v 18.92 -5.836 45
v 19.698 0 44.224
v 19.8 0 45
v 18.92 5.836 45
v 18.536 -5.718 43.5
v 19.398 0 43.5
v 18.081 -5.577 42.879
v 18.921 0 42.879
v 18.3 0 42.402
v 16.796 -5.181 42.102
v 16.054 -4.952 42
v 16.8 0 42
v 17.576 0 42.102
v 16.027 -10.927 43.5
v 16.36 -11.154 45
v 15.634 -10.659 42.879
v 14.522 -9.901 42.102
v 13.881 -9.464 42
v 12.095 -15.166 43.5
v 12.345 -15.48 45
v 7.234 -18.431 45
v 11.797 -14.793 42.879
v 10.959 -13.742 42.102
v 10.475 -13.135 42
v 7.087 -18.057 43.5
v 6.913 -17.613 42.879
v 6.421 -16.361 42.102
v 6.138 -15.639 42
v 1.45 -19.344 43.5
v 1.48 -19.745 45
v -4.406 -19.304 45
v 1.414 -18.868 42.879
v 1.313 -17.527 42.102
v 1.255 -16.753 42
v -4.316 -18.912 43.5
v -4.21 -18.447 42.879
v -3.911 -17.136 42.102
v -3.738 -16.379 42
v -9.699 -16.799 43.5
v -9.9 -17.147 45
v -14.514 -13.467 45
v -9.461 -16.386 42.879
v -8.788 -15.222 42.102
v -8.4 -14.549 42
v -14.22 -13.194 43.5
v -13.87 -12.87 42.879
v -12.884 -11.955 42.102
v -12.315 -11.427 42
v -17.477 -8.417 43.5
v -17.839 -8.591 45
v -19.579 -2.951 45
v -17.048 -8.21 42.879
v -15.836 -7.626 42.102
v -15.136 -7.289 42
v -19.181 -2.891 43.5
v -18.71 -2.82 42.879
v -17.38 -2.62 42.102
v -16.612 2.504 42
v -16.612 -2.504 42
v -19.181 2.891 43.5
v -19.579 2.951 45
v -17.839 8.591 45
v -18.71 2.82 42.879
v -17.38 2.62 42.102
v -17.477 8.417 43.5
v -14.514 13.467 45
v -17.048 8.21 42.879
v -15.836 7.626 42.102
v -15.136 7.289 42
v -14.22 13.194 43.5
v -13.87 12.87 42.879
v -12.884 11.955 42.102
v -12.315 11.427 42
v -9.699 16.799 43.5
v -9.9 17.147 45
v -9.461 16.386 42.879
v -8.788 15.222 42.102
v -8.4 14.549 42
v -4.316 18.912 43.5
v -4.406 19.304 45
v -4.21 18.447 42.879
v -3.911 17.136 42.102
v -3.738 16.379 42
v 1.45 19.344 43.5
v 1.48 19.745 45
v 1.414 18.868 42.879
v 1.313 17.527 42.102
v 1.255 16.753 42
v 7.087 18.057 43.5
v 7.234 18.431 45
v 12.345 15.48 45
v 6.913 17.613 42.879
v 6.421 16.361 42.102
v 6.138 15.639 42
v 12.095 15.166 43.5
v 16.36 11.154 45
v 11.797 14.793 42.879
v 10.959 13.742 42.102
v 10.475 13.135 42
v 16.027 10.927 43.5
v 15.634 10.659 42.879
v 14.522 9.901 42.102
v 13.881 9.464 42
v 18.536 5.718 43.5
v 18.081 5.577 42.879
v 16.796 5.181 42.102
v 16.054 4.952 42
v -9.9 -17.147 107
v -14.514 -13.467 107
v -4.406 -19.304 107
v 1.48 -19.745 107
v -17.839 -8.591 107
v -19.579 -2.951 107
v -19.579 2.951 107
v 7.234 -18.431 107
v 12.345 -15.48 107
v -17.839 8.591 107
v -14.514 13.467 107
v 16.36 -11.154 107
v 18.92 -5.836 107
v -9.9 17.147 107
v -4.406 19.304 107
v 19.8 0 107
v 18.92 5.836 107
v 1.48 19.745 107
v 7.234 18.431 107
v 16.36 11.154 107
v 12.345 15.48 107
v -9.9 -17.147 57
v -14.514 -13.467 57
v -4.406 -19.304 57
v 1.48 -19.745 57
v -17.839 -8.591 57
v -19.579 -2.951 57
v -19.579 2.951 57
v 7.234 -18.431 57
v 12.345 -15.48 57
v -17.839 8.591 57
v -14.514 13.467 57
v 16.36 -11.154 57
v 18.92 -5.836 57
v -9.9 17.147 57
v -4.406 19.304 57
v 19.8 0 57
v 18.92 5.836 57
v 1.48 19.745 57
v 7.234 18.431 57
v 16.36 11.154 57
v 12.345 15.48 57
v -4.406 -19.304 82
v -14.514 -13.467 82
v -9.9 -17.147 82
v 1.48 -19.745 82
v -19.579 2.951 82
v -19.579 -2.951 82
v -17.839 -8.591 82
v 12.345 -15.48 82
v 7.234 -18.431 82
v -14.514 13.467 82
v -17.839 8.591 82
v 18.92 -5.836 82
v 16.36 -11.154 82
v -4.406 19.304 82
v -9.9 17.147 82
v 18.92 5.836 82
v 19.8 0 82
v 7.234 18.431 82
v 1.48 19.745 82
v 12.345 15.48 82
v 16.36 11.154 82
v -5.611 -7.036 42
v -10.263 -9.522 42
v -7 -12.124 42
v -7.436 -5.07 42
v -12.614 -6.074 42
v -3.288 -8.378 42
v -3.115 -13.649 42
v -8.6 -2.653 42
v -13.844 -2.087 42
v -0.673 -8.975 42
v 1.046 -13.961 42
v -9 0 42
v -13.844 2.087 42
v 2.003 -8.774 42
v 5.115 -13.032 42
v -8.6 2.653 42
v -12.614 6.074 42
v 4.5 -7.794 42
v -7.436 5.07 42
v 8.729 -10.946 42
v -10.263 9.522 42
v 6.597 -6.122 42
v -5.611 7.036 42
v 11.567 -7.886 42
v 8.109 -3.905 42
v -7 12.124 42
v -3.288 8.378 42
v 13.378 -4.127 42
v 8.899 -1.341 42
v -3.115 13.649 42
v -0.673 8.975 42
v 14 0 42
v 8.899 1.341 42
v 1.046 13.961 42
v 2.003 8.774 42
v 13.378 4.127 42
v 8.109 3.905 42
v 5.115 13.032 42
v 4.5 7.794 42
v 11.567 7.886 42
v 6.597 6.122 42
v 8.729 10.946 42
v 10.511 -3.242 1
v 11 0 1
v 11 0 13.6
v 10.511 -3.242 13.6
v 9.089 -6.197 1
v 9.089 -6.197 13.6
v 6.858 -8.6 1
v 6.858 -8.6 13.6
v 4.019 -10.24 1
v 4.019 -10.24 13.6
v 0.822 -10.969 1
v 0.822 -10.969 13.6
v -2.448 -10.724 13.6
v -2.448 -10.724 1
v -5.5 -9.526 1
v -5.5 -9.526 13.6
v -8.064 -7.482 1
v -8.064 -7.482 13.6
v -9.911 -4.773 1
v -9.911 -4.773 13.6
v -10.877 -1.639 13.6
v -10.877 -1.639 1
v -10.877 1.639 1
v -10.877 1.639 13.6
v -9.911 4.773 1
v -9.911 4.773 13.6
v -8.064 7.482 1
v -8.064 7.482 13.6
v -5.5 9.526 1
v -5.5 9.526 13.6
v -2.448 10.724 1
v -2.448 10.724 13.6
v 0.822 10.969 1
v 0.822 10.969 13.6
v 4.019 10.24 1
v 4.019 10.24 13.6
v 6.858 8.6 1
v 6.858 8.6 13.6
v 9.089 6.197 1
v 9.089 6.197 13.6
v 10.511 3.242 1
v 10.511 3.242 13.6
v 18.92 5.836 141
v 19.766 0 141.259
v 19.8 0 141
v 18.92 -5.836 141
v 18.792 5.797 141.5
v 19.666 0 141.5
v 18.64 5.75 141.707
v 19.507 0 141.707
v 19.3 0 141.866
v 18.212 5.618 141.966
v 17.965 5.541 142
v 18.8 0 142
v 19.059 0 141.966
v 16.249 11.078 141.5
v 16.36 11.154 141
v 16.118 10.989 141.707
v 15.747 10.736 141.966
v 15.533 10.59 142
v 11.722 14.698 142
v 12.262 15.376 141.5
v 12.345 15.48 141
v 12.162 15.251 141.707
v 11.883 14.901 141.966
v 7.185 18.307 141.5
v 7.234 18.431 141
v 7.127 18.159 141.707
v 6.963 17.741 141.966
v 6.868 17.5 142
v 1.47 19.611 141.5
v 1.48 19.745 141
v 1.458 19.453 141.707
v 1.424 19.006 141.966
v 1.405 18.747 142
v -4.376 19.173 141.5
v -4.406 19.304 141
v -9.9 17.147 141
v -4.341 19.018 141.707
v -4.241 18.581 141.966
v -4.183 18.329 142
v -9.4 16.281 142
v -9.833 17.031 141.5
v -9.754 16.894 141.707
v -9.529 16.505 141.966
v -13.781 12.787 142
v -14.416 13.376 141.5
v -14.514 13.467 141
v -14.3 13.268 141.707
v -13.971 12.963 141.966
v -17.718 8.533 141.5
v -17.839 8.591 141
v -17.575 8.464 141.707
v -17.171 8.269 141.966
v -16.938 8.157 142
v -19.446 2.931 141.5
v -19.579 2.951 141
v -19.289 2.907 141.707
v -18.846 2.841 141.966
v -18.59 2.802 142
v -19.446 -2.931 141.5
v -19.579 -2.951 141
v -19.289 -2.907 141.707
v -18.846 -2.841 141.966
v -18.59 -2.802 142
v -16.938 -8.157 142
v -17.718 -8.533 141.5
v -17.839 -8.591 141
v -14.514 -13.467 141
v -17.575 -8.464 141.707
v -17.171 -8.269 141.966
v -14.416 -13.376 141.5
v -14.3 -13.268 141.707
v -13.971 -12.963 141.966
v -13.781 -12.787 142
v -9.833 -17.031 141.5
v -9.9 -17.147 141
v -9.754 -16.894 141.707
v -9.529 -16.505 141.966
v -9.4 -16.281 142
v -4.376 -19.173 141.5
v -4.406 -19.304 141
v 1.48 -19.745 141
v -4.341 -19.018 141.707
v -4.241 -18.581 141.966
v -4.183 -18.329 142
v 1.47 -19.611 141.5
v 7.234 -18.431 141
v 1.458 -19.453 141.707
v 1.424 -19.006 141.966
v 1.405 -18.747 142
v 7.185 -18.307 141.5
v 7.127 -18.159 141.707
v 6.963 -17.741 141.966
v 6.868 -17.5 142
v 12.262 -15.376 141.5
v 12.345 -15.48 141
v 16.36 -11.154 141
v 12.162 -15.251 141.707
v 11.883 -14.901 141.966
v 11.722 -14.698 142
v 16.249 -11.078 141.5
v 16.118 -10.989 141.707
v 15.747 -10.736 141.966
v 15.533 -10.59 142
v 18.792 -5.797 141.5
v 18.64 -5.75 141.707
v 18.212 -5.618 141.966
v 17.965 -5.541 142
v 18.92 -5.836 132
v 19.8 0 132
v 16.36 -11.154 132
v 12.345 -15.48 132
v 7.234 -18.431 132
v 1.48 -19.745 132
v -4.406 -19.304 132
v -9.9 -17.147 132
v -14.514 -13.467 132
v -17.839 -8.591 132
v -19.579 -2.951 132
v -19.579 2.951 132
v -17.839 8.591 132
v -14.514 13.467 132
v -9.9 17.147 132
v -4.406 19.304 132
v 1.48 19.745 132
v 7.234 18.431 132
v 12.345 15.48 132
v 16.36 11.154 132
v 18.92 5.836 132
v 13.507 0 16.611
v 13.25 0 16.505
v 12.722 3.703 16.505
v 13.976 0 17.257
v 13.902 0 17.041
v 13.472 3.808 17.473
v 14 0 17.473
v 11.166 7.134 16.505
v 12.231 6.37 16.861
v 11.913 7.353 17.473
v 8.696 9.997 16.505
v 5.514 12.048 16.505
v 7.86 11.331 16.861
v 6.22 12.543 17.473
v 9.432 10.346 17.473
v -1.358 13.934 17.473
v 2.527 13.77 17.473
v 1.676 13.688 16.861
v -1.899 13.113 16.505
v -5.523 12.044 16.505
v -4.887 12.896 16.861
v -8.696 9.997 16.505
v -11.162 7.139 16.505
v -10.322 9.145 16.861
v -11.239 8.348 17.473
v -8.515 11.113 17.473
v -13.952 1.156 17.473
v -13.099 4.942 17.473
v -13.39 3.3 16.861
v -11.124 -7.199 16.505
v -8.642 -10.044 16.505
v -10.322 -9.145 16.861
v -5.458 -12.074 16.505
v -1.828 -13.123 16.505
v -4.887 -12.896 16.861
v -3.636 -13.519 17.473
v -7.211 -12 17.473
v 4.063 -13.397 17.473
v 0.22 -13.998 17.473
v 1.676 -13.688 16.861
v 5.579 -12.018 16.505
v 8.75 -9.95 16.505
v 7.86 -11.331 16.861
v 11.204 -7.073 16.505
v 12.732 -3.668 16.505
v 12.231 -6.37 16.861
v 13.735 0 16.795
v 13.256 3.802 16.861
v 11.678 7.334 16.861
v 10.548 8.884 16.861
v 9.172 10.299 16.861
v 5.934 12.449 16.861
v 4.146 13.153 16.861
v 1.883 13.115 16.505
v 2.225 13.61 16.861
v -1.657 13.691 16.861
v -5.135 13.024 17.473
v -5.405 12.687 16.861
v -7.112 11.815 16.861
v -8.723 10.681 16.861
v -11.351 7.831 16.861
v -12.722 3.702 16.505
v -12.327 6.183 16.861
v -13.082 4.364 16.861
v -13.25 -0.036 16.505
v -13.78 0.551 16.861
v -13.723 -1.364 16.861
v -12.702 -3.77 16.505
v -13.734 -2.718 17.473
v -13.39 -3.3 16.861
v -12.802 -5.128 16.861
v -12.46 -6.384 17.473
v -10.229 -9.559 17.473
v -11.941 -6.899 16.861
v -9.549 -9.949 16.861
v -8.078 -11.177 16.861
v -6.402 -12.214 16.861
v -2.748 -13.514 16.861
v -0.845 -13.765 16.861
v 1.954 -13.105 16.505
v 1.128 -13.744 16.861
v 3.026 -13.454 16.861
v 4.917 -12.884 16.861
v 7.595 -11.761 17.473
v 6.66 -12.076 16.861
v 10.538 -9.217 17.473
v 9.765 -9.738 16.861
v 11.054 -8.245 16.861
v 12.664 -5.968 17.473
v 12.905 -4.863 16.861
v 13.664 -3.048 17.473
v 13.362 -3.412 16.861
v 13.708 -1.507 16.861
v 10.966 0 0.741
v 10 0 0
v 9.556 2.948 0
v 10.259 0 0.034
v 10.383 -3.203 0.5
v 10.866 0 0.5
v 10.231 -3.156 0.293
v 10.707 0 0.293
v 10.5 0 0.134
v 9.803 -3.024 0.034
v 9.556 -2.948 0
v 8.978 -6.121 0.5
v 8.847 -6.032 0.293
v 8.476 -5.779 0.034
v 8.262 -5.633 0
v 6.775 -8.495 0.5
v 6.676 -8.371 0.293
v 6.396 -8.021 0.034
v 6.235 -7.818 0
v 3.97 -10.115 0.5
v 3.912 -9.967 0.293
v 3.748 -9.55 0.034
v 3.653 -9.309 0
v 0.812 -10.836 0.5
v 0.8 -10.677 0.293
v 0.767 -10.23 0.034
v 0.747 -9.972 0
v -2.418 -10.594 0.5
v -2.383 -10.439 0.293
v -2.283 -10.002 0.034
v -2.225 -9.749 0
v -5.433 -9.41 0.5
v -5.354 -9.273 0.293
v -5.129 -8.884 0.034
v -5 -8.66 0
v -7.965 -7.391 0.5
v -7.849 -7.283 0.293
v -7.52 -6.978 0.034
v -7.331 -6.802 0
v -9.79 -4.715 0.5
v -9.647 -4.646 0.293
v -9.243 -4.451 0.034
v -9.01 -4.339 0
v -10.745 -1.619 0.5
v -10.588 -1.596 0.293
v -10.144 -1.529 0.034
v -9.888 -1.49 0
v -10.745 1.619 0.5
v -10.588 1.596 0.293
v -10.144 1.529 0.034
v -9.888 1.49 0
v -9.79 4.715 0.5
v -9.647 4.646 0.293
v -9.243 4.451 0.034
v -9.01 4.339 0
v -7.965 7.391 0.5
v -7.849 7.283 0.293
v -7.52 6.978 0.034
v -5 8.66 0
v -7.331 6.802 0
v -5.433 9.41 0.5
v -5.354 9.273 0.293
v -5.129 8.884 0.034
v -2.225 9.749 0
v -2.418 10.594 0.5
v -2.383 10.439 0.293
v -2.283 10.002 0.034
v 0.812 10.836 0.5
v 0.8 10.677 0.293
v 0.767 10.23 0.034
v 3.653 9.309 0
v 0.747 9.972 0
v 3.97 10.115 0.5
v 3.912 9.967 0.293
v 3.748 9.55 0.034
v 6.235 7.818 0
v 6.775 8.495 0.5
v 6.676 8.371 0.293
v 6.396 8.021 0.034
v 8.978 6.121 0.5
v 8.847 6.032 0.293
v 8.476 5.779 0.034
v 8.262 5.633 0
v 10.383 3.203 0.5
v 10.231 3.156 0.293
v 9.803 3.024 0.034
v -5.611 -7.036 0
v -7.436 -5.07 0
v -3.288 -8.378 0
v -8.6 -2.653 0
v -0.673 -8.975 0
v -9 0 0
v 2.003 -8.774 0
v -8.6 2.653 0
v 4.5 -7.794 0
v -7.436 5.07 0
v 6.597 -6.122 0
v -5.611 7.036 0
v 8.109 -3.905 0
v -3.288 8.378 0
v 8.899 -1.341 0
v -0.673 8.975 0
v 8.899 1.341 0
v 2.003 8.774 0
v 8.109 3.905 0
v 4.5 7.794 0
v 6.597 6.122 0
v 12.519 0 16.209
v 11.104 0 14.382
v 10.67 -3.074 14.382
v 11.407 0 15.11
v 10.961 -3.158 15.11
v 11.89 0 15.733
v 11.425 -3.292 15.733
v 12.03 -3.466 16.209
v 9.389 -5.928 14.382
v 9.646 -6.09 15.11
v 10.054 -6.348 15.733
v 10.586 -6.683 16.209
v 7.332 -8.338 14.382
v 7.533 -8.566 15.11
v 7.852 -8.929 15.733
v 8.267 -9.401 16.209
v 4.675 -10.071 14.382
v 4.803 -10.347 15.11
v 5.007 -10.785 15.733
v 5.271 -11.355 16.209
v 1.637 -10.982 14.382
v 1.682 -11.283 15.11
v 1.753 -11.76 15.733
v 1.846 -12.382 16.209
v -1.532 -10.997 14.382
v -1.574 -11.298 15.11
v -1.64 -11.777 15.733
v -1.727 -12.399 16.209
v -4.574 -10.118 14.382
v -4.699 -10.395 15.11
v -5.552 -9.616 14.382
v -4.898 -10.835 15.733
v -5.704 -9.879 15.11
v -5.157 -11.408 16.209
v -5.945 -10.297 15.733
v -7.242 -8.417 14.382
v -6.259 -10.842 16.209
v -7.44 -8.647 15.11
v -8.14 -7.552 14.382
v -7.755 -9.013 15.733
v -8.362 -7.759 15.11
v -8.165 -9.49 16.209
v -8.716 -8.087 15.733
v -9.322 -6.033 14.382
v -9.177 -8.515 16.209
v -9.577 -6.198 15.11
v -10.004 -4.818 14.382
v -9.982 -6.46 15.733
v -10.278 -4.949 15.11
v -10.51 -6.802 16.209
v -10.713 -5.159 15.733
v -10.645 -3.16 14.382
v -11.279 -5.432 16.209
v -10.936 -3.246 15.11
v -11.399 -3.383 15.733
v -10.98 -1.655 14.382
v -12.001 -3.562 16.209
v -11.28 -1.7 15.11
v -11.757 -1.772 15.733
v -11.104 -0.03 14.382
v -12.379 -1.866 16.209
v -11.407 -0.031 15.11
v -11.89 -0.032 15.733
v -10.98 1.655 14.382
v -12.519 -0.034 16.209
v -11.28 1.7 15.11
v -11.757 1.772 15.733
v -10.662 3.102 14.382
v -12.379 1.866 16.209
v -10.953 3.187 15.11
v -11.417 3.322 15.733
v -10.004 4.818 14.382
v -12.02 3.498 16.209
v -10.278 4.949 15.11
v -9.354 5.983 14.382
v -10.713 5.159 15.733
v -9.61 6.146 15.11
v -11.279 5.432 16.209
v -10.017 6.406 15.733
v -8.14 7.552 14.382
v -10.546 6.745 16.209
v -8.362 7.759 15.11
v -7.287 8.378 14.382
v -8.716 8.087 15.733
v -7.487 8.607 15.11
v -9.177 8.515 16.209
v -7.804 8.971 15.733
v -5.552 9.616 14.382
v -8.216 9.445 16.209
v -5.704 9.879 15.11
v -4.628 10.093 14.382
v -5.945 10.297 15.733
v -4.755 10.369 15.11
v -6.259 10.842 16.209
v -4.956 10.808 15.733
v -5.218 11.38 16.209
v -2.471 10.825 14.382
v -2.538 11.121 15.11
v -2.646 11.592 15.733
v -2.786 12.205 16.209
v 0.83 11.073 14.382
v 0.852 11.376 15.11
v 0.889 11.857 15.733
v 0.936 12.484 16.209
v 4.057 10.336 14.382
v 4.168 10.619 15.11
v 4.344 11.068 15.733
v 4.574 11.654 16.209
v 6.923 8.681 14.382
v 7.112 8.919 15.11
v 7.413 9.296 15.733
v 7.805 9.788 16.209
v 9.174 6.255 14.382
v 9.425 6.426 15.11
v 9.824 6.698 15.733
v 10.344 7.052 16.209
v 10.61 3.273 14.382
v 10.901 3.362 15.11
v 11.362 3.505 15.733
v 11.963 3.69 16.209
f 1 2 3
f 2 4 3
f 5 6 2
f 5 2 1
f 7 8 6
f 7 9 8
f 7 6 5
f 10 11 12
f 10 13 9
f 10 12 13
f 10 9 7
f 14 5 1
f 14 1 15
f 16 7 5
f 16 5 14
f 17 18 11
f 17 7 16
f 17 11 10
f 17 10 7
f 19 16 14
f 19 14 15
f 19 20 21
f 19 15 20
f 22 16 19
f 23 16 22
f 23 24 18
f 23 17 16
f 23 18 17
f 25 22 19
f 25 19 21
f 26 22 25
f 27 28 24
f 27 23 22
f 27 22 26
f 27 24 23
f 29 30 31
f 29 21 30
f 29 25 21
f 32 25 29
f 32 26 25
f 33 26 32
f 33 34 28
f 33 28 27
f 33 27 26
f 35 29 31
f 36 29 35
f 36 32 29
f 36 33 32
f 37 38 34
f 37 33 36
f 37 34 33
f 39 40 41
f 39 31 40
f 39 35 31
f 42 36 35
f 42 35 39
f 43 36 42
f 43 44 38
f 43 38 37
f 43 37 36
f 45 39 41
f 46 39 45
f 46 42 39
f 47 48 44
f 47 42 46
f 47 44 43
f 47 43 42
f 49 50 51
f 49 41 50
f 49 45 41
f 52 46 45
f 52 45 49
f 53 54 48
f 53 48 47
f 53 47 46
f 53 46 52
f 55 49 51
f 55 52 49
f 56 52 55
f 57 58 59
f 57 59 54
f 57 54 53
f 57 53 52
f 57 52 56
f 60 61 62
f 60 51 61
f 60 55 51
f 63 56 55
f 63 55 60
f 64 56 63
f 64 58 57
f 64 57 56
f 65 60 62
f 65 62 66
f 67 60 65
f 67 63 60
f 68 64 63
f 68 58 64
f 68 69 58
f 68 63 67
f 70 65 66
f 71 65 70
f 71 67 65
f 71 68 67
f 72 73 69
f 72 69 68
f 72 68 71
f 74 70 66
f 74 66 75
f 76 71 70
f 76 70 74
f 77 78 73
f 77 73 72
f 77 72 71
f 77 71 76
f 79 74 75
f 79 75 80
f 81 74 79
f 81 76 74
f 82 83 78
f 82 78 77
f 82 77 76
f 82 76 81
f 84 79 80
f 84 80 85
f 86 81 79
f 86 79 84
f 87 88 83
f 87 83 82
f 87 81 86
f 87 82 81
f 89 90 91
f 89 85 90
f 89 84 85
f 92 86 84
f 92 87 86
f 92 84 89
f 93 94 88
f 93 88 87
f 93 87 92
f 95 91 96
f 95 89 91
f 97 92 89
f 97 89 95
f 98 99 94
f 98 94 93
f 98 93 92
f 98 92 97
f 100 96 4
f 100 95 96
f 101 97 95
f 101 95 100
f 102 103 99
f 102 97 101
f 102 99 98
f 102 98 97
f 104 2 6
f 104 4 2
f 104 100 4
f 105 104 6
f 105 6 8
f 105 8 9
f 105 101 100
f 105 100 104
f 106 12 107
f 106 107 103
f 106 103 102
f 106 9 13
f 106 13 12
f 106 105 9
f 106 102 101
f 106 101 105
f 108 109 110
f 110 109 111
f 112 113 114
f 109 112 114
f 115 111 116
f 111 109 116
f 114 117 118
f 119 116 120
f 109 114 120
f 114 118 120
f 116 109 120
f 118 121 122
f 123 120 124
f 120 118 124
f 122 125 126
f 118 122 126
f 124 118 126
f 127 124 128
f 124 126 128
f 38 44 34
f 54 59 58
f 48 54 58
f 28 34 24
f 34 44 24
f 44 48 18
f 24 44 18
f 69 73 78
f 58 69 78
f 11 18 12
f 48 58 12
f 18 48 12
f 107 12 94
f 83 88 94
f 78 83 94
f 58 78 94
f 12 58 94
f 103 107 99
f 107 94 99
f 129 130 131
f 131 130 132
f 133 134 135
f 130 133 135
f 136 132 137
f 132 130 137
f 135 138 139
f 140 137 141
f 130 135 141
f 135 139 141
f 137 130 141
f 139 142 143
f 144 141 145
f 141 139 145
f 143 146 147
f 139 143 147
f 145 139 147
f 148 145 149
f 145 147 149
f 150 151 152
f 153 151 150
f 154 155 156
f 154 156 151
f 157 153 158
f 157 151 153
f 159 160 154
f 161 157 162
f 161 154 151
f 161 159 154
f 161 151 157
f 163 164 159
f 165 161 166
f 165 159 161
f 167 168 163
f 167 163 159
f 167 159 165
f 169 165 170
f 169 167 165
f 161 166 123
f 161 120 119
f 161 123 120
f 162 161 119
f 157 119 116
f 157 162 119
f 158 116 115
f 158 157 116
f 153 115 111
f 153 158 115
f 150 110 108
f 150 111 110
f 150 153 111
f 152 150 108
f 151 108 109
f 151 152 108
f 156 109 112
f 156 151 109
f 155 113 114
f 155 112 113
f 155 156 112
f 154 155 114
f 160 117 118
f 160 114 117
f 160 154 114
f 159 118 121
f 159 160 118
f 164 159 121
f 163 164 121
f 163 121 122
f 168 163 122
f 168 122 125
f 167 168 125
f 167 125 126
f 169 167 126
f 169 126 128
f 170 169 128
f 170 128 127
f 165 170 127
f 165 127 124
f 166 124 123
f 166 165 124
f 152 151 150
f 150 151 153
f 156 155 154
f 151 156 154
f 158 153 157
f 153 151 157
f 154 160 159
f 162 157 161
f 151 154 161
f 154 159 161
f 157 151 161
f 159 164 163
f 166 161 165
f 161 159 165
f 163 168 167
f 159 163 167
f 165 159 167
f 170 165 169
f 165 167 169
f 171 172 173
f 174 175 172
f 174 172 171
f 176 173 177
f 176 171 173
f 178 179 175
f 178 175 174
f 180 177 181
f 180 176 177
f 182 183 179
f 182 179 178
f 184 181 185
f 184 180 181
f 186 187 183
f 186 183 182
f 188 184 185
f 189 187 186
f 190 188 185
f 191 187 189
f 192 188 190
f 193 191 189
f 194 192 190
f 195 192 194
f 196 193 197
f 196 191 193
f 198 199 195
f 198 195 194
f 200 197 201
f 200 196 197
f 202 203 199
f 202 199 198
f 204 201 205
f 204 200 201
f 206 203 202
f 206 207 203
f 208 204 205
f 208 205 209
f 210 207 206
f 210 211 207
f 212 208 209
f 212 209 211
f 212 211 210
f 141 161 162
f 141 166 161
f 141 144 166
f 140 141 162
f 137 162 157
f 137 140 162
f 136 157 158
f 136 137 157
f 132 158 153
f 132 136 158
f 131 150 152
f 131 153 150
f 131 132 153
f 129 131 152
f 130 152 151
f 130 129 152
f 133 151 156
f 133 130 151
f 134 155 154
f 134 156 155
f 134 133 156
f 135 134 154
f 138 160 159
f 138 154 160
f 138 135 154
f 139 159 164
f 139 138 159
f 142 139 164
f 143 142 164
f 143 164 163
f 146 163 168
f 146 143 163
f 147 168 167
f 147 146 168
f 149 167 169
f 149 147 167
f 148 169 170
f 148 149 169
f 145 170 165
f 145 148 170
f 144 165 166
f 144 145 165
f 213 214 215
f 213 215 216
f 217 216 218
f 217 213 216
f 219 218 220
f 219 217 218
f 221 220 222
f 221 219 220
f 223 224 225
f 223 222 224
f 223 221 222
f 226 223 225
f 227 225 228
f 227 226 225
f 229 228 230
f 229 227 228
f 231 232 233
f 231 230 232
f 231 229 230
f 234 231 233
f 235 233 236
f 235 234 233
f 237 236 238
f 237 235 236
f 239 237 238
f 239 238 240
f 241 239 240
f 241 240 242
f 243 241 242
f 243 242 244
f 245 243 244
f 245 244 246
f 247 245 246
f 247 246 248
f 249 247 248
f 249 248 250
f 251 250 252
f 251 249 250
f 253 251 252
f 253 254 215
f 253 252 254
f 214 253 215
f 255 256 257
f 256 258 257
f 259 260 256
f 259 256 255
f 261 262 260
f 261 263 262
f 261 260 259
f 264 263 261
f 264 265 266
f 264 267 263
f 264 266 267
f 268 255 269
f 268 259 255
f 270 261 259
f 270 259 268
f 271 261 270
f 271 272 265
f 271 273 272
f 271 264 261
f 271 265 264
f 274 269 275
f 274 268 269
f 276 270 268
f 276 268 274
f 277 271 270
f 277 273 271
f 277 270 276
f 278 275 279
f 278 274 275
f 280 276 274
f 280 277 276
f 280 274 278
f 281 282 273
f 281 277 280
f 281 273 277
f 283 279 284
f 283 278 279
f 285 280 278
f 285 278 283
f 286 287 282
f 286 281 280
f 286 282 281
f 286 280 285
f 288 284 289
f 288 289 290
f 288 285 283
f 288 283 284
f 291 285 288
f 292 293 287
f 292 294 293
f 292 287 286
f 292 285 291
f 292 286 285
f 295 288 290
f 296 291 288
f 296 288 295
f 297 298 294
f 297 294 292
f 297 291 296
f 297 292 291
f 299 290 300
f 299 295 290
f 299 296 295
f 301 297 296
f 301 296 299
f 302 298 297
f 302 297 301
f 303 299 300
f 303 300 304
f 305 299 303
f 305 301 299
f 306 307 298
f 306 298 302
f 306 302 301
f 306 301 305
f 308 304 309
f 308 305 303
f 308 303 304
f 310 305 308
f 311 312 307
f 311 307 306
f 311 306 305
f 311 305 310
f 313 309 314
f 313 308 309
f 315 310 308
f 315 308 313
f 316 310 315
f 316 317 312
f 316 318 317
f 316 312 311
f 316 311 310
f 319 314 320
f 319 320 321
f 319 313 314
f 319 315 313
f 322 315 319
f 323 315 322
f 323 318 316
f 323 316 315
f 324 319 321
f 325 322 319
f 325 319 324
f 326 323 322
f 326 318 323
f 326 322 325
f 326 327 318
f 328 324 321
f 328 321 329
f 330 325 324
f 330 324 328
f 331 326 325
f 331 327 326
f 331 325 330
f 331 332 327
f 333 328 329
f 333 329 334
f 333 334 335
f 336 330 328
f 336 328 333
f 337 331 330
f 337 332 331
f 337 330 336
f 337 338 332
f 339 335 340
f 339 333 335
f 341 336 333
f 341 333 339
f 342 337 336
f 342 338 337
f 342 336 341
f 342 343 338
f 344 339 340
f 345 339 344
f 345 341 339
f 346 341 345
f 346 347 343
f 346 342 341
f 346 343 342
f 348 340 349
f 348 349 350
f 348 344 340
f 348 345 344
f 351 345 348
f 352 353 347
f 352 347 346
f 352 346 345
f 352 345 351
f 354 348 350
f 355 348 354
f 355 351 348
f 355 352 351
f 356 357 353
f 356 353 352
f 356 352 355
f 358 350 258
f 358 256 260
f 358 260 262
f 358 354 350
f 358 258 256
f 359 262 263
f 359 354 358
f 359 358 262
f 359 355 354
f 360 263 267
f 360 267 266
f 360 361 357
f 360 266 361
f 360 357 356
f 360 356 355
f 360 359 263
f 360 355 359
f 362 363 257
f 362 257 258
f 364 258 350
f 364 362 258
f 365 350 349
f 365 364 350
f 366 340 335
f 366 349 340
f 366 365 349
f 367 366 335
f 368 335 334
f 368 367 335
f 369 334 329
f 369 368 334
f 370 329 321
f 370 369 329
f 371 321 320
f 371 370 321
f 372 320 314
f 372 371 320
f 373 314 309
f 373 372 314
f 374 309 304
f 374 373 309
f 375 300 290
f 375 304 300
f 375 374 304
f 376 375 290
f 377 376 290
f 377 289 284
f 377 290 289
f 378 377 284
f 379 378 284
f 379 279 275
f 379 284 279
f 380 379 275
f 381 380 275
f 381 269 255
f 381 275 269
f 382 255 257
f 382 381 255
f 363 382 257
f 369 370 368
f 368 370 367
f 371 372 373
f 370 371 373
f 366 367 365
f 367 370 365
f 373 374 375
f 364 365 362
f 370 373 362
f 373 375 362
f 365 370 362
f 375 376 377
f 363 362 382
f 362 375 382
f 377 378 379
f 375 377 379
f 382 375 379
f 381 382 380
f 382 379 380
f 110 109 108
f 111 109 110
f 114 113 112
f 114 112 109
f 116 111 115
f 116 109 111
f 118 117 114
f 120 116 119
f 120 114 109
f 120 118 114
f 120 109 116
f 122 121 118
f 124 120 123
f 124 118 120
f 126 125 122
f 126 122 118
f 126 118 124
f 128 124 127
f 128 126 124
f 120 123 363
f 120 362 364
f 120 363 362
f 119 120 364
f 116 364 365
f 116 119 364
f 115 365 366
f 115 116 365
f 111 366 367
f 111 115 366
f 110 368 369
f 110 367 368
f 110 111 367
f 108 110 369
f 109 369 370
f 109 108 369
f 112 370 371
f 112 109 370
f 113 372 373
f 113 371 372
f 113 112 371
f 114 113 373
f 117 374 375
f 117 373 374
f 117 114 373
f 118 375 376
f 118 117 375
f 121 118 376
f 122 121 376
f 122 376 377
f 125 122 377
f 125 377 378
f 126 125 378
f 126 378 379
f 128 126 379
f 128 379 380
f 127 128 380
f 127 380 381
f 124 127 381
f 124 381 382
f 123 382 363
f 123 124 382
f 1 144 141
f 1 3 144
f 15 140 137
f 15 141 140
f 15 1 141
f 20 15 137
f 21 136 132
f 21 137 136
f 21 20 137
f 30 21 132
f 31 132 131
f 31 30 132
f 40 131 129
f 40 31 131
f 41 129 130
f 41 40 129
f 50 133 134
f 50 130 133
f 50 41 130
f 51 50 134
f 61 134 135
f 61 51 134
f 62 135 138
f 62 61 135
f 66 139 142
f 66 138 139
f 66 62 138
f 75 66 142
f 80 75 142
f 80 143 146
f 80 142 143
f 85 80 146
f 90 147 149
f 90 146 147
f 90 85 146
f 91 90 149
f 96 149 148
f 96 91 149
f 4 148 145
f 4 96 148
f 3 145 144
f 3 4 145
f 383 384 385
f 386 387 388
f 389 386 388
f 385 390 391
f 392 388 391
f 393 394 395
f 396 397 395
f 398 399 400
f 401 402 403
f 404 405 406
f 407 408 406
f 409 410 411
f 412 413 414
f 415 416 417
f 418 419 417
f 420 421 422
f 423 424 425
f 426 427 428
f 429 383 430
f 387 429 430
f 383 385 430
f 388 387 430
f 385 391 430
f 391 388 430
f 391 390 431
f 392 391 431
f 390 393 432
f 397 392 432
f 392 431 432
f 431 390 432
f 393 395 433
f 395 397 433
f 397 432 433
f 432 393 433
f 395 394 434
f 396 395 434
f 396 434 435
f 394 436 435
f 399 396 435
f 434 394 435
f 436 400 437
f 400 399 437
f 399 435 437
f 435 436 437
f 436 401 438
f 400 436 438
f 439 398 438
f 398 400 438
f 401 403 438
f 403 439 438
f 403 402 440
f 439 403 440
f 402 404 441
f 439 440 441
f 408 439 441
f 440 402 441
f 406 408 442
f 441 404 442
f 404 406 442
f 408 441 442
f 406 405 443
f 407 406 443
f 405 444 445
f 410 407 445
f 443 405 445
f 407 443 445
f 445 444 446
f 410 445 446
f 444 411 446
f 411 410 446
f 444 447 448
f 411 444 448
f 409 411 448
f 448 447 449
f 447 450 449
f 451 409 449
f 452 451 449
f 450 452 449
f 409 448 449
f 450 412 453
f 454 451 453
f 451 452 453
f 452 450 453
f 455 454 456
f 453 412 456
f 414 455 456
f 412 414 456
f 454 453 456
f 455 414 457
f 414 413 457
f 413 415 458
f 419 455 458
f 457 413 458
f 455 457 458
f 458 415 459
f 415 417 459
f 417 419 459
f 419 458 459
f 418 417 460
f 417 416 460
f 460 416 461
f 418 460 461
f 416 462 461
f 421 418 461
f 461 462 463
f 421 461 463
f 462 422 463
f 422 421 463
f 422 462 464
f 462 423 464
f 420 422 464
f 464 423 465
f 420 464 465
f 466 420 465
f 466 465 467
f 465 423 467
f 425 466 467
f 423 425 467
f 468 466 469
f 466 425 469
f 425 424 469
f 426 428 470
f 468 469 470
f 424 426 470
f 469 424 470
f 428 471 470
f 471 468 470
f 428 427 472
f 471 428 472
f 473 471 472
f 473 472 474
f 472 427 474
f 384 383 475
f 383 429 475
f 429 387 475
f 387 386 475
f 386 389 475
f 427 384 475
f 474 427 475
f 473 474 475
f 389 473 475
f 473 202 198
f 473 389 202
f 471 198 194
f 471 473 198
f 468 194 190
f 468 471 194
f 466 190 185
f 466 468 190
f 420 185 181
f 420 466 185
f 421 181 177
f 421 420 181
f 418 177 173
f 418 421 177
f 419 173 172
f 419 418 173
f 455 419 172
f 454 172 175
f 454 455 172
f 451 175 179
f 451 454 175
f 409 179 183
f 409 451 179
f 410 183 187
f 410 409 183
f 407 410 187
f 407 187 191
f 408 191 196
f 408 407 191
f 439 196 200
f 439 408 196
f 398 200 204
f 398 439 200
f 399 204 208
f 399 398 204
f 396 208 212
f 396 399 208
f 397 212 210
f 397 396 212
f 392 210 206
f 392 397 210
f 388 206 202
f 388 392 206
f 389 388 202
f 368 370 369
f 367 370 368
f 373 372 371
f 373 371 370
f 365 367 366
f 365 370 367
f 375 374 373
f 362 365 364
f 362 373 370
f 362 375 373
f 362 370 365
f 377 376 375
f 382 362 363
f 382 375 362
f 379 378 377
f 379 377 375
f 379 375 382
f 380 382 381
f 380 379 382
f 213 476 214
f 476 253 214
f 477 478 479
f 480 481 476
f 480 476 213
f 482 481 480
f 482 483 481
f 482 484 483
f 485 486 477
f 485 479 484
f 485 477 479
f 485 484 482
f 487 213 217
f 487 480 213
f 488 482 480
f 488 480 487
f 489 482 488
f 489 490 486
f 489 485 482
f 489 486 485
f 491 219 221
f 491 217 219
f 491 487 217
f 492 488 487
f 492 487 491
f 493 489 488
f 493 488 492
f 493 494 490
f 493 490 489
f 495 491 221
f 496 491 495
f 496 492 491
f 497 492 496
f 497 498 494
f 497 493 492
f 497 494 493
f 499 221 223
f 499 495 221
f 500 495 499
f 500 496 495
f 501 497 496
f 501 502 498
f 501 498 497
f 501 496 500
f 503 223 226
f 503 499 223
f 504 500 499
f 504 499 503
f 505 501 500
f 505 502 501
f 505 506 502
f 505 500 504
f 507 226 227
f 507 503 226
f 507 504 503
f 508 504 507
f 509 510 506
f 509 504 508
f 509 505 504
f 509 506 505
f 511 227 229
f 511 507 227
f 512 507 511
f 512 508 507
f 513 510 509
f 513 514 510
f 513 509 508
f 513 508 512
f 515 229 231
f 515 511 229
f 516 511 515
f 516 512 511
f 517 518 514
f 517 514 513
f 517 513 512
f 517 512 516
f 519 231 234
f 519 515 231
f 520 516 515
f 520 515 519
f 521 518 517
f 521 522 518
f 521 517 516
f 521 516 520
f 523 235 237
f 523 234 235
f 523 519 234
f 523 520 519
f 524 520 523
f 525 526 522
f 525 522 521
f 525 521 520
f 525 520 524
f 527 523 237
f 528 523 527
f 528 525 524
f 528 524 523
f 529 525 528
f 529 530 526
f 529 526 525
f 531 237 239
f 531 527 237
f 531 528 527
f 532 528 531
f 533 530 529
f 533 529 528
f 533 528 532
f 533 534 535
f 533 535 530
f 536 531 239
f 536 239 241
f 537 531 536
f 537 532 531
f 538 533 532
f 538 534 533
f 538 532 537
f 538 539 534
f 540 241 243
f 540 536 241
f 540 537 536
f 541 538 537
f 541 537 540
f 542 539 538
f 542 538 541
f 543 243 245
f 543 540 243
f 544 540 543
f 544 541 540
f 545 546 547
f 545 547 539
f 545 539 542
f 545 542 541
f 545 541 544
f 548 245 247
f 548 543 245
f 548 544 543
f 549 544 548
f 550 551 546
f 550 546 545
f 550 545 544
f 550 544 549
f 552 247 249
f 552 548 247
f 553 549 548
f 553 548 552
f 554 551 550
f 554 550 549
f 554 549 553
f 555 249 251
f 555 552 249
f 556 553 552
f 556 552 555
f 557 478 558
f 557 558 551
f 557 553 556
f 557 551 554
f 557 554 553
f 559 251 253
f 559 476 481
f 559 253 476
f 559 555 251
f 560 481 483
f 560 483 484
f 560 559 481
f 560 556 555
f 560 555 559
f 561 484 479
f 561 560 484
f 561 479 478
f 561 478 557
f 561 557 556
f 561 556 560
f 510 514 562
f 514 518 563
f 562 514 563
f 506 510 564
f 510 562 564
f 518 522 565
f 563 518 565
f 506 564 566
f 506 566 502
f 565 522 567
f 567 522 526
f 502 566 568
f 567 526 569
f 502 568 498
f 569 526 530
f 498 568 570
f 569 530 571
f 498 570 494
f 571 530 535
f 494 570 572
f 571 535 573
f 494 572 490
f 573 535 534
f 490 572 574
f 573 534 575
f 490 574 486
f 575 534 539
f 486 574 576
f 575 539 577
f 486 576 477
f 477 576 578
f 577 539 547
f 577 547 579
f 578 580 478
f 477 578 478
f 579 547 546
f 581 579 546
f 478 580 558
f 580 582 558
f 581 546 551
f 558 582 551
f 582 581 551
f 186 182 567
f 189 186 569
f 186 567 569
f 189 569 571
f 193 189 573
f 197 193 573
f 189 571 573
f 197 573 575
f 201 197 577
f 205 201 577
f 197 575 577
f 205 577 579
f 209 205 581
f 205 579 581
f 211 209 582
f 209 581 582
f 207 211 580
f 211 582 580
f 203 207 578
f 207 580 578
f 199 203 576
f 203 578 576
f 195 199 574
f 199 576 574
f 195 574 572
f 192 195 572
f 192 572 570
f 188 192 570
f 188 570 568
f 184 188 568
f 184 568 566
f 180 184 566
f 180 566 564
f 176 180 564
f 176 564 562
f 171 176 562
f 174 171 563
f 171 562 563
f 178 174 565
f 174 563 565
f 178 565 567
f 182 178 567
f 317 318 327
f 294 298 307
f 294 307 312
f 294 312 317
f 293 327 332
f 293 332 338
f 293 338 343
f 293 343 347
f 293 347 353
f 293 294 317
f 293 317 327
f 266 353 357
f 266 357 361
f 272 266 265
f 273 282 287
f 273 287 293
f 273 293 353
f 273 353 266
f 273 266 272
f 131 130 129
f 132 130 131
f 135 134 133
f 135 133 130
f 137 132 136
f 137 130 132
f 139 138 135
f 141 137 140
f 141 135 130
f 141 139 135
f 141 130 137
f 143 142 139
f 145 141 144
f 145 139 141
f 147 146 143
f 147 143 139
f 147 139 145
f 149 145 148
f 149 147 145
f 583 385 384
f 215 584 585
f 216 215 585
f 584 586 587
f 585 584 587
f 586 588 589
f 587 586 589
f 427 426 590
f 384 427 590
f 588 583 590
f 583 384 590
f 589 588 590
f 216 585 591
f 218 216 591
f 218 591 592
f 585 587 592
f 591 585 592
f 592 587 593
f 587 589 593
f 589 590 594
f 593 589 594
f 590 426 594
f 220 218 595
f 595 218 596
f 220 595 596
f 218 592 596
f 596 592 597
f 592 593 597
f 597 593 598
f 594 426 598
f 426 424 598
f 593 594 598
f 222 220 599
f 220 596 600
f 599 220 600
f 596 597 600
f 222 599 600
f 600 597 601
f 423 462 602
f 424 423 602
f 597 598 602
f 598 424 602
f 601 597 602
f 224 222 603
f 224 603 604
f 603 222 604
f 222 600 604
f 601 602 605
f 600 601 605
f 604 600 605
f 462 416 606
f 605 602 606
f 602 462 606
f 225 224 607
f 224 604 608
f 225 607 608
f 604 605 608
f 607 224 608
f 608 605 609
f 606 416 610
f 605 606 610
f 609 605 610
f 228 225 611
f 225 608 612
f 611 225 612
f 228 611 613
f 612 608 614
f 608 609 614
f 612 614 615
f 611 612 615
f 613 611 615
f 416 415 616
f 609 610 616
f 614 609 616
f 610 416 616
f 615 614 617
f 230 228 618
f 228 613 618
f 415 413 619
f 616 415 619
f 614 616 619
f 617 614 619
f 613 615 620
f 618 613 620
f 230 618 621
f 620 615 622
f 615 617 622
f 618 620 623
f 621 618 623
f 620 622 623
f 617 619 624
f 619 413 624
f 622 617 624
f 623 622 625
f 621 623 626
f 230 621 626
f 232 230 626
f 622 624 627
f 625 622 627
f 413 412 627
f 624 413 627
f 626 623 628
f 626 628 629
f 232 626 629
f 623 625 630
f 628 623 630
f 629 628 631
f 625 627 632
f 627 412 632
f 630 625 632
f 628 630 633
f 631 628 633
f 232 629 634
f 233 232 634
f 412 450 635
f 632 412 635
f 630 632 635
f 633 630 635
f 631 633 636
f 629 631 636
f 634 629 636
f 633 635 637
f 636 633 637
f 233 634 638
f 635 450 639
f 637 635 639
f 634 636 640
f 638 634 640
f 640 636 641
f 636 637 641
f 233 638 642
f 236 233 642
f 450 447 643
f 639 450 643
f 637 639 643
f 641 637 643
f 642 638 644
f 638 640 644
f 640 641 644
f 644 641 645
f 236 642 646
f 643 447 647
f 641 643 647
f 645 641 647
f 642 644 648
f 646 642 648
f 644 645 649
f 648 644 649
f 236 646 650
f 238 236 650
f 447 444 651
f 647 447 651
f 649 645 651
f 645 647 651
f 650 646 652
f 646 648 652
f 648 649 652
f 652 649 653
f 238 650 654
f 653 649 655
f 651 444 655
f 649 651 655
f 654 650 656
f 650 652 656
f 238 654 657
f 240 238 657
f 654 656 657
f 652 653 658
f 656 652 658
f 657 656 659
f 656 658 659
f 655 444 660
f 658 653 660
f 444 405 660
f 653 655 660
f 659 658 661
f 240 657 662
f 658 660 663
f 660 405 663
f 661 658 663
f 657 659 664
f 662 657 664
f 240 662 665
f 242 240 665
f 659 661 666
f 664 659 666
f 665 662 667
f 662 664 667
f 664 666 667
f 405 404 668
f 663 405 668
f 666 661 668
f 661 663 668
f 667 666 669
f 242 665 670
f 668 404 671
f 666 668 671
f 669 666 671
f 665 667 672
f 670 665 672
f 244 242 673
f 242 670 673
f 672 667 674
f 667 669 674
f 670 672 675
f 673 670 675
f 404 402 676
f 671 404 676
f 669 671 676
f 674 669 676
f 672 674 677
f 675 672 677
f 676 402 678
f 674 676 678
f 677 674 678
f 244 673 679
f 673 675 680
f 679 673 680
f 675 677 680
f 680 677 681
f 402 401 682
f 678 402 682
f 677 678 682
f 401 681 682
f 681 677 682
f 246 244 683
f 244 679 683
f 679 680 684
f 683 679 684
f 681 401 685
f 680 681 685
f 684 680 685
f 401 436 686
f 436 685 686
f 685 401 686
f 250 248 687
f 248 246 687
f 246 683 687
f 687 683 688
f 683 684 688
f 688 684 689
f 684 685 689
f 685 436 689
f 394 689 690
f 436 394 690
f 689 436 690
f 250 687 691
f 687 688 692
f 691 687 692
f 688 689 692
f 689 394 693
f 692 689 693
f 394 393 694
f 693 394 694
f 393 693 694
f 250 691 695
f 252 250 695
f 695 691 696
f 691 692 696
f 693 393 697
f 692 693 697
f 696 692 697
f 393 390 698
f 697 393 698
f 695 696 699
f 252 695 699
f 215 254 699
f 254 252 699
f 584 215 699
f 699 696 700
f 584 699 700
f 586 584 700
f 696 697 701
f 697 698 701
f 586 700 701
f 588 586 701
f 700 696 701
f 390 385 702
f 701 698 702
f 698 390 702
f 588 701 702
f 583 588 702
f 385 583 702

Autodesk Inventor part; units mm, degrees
ref_plane "YZ Plane" through (0, 0, 0) normal (1, 0, 0) x (0, 1, 0)
ref_plane "XZ Plane" through (0, 0, 0) normal (0, 1, 0) x (-1, 0, 0)
ref_plane "XY Plane" through (0, 0, 0) normal (0, 0, 1) x (1, 0, 0)
sketch "Sketch1" plane through (0, 0, 0) normal (0, 0, 1) x (1, 0, 0)
  circle A0 centre (0, 0) radius 11
  dimension "d0" = 22
extrude "Extrusion1" add sketch "Sketch1" along normal blind 16.6
sketch "Sketch2" plane through (0, 0, 16.6) normal (0, 0, 1) x (1, 0, 0)
  circle A0 centre (0, 0) radius 14
  dimension "d3" = 28
extrude "Extrusion2" add sketch "Sketch2" along normal blind 25.4
sketch "Sketch3" plane through (0, 0, 0) normal (0, 0, -1) x (-1, 0, 0)
  circle A0 centre (0, 0) radius 9
  dimension "d6" = 18
extrude "Extrusion3" cut sketch "Sketch3" against normal through all
fillet "Fillet1" radius 1 1 edges at (-11, 0, 0)
fillet "Fillet2" radius 3 1 edges at (-11, 0, 16.6)
sketch "Sketch4" plane through (0, 0, 42) normal (0, 0, 1) x (1, 0, 0)
  circle A0 centre (0, 0) radius 19.8
  dimension "d11" = 39.6
extrude "Extrusion4" add sketch "Sketch4" along normal blind 15 separate body
sketch "Sketch5" plane through (0, 0, 57) normal (0, 0, 1) x (1, 0, 0)
  circle A0 centre (0, 0) radius 19.8
extrude "Extrusion5" add sketch "Sketch5" along normal blind 25 separate body
sketch "Sketch6" plane through (0, 0, 82) normal (0, 0, 1) x (1, 0, 0)
  circle A0 centre (0, 0) radius 19.8
extrude "Extrusion6" add sketch "Sketch6" along normal blind 25 separate body
sketch "Sketch7" plane through (0, 0, 107) normal (0, 0, 1) x (1, 0, 0)
  circle A0 centre (0, 0) radius 19.8
extrude "Extrusion7" add sketch "Sketch7" along normal blind 25 separate body
sketch "Sketch8" plane through (0, 0, 132) normal (0, 0, 1) x (1, 0, 0)
  circle A0 centre (0, 0) radius 19.8
extrude "Extrusion8" add sketch "Sketch8" along normal blind 10 separate body
fillet "Fillet3" radius 1 2 edges at (-13.9995, 0, 16.6) (-14, 0, 16.6)
fillet "Fillet4" radius 3 1 edges at (-19.8, 0, 42)
fillet "Fillet5" radius 1 1 edges at (-19.8, 0, 142)
properties part number "Light Stack"
